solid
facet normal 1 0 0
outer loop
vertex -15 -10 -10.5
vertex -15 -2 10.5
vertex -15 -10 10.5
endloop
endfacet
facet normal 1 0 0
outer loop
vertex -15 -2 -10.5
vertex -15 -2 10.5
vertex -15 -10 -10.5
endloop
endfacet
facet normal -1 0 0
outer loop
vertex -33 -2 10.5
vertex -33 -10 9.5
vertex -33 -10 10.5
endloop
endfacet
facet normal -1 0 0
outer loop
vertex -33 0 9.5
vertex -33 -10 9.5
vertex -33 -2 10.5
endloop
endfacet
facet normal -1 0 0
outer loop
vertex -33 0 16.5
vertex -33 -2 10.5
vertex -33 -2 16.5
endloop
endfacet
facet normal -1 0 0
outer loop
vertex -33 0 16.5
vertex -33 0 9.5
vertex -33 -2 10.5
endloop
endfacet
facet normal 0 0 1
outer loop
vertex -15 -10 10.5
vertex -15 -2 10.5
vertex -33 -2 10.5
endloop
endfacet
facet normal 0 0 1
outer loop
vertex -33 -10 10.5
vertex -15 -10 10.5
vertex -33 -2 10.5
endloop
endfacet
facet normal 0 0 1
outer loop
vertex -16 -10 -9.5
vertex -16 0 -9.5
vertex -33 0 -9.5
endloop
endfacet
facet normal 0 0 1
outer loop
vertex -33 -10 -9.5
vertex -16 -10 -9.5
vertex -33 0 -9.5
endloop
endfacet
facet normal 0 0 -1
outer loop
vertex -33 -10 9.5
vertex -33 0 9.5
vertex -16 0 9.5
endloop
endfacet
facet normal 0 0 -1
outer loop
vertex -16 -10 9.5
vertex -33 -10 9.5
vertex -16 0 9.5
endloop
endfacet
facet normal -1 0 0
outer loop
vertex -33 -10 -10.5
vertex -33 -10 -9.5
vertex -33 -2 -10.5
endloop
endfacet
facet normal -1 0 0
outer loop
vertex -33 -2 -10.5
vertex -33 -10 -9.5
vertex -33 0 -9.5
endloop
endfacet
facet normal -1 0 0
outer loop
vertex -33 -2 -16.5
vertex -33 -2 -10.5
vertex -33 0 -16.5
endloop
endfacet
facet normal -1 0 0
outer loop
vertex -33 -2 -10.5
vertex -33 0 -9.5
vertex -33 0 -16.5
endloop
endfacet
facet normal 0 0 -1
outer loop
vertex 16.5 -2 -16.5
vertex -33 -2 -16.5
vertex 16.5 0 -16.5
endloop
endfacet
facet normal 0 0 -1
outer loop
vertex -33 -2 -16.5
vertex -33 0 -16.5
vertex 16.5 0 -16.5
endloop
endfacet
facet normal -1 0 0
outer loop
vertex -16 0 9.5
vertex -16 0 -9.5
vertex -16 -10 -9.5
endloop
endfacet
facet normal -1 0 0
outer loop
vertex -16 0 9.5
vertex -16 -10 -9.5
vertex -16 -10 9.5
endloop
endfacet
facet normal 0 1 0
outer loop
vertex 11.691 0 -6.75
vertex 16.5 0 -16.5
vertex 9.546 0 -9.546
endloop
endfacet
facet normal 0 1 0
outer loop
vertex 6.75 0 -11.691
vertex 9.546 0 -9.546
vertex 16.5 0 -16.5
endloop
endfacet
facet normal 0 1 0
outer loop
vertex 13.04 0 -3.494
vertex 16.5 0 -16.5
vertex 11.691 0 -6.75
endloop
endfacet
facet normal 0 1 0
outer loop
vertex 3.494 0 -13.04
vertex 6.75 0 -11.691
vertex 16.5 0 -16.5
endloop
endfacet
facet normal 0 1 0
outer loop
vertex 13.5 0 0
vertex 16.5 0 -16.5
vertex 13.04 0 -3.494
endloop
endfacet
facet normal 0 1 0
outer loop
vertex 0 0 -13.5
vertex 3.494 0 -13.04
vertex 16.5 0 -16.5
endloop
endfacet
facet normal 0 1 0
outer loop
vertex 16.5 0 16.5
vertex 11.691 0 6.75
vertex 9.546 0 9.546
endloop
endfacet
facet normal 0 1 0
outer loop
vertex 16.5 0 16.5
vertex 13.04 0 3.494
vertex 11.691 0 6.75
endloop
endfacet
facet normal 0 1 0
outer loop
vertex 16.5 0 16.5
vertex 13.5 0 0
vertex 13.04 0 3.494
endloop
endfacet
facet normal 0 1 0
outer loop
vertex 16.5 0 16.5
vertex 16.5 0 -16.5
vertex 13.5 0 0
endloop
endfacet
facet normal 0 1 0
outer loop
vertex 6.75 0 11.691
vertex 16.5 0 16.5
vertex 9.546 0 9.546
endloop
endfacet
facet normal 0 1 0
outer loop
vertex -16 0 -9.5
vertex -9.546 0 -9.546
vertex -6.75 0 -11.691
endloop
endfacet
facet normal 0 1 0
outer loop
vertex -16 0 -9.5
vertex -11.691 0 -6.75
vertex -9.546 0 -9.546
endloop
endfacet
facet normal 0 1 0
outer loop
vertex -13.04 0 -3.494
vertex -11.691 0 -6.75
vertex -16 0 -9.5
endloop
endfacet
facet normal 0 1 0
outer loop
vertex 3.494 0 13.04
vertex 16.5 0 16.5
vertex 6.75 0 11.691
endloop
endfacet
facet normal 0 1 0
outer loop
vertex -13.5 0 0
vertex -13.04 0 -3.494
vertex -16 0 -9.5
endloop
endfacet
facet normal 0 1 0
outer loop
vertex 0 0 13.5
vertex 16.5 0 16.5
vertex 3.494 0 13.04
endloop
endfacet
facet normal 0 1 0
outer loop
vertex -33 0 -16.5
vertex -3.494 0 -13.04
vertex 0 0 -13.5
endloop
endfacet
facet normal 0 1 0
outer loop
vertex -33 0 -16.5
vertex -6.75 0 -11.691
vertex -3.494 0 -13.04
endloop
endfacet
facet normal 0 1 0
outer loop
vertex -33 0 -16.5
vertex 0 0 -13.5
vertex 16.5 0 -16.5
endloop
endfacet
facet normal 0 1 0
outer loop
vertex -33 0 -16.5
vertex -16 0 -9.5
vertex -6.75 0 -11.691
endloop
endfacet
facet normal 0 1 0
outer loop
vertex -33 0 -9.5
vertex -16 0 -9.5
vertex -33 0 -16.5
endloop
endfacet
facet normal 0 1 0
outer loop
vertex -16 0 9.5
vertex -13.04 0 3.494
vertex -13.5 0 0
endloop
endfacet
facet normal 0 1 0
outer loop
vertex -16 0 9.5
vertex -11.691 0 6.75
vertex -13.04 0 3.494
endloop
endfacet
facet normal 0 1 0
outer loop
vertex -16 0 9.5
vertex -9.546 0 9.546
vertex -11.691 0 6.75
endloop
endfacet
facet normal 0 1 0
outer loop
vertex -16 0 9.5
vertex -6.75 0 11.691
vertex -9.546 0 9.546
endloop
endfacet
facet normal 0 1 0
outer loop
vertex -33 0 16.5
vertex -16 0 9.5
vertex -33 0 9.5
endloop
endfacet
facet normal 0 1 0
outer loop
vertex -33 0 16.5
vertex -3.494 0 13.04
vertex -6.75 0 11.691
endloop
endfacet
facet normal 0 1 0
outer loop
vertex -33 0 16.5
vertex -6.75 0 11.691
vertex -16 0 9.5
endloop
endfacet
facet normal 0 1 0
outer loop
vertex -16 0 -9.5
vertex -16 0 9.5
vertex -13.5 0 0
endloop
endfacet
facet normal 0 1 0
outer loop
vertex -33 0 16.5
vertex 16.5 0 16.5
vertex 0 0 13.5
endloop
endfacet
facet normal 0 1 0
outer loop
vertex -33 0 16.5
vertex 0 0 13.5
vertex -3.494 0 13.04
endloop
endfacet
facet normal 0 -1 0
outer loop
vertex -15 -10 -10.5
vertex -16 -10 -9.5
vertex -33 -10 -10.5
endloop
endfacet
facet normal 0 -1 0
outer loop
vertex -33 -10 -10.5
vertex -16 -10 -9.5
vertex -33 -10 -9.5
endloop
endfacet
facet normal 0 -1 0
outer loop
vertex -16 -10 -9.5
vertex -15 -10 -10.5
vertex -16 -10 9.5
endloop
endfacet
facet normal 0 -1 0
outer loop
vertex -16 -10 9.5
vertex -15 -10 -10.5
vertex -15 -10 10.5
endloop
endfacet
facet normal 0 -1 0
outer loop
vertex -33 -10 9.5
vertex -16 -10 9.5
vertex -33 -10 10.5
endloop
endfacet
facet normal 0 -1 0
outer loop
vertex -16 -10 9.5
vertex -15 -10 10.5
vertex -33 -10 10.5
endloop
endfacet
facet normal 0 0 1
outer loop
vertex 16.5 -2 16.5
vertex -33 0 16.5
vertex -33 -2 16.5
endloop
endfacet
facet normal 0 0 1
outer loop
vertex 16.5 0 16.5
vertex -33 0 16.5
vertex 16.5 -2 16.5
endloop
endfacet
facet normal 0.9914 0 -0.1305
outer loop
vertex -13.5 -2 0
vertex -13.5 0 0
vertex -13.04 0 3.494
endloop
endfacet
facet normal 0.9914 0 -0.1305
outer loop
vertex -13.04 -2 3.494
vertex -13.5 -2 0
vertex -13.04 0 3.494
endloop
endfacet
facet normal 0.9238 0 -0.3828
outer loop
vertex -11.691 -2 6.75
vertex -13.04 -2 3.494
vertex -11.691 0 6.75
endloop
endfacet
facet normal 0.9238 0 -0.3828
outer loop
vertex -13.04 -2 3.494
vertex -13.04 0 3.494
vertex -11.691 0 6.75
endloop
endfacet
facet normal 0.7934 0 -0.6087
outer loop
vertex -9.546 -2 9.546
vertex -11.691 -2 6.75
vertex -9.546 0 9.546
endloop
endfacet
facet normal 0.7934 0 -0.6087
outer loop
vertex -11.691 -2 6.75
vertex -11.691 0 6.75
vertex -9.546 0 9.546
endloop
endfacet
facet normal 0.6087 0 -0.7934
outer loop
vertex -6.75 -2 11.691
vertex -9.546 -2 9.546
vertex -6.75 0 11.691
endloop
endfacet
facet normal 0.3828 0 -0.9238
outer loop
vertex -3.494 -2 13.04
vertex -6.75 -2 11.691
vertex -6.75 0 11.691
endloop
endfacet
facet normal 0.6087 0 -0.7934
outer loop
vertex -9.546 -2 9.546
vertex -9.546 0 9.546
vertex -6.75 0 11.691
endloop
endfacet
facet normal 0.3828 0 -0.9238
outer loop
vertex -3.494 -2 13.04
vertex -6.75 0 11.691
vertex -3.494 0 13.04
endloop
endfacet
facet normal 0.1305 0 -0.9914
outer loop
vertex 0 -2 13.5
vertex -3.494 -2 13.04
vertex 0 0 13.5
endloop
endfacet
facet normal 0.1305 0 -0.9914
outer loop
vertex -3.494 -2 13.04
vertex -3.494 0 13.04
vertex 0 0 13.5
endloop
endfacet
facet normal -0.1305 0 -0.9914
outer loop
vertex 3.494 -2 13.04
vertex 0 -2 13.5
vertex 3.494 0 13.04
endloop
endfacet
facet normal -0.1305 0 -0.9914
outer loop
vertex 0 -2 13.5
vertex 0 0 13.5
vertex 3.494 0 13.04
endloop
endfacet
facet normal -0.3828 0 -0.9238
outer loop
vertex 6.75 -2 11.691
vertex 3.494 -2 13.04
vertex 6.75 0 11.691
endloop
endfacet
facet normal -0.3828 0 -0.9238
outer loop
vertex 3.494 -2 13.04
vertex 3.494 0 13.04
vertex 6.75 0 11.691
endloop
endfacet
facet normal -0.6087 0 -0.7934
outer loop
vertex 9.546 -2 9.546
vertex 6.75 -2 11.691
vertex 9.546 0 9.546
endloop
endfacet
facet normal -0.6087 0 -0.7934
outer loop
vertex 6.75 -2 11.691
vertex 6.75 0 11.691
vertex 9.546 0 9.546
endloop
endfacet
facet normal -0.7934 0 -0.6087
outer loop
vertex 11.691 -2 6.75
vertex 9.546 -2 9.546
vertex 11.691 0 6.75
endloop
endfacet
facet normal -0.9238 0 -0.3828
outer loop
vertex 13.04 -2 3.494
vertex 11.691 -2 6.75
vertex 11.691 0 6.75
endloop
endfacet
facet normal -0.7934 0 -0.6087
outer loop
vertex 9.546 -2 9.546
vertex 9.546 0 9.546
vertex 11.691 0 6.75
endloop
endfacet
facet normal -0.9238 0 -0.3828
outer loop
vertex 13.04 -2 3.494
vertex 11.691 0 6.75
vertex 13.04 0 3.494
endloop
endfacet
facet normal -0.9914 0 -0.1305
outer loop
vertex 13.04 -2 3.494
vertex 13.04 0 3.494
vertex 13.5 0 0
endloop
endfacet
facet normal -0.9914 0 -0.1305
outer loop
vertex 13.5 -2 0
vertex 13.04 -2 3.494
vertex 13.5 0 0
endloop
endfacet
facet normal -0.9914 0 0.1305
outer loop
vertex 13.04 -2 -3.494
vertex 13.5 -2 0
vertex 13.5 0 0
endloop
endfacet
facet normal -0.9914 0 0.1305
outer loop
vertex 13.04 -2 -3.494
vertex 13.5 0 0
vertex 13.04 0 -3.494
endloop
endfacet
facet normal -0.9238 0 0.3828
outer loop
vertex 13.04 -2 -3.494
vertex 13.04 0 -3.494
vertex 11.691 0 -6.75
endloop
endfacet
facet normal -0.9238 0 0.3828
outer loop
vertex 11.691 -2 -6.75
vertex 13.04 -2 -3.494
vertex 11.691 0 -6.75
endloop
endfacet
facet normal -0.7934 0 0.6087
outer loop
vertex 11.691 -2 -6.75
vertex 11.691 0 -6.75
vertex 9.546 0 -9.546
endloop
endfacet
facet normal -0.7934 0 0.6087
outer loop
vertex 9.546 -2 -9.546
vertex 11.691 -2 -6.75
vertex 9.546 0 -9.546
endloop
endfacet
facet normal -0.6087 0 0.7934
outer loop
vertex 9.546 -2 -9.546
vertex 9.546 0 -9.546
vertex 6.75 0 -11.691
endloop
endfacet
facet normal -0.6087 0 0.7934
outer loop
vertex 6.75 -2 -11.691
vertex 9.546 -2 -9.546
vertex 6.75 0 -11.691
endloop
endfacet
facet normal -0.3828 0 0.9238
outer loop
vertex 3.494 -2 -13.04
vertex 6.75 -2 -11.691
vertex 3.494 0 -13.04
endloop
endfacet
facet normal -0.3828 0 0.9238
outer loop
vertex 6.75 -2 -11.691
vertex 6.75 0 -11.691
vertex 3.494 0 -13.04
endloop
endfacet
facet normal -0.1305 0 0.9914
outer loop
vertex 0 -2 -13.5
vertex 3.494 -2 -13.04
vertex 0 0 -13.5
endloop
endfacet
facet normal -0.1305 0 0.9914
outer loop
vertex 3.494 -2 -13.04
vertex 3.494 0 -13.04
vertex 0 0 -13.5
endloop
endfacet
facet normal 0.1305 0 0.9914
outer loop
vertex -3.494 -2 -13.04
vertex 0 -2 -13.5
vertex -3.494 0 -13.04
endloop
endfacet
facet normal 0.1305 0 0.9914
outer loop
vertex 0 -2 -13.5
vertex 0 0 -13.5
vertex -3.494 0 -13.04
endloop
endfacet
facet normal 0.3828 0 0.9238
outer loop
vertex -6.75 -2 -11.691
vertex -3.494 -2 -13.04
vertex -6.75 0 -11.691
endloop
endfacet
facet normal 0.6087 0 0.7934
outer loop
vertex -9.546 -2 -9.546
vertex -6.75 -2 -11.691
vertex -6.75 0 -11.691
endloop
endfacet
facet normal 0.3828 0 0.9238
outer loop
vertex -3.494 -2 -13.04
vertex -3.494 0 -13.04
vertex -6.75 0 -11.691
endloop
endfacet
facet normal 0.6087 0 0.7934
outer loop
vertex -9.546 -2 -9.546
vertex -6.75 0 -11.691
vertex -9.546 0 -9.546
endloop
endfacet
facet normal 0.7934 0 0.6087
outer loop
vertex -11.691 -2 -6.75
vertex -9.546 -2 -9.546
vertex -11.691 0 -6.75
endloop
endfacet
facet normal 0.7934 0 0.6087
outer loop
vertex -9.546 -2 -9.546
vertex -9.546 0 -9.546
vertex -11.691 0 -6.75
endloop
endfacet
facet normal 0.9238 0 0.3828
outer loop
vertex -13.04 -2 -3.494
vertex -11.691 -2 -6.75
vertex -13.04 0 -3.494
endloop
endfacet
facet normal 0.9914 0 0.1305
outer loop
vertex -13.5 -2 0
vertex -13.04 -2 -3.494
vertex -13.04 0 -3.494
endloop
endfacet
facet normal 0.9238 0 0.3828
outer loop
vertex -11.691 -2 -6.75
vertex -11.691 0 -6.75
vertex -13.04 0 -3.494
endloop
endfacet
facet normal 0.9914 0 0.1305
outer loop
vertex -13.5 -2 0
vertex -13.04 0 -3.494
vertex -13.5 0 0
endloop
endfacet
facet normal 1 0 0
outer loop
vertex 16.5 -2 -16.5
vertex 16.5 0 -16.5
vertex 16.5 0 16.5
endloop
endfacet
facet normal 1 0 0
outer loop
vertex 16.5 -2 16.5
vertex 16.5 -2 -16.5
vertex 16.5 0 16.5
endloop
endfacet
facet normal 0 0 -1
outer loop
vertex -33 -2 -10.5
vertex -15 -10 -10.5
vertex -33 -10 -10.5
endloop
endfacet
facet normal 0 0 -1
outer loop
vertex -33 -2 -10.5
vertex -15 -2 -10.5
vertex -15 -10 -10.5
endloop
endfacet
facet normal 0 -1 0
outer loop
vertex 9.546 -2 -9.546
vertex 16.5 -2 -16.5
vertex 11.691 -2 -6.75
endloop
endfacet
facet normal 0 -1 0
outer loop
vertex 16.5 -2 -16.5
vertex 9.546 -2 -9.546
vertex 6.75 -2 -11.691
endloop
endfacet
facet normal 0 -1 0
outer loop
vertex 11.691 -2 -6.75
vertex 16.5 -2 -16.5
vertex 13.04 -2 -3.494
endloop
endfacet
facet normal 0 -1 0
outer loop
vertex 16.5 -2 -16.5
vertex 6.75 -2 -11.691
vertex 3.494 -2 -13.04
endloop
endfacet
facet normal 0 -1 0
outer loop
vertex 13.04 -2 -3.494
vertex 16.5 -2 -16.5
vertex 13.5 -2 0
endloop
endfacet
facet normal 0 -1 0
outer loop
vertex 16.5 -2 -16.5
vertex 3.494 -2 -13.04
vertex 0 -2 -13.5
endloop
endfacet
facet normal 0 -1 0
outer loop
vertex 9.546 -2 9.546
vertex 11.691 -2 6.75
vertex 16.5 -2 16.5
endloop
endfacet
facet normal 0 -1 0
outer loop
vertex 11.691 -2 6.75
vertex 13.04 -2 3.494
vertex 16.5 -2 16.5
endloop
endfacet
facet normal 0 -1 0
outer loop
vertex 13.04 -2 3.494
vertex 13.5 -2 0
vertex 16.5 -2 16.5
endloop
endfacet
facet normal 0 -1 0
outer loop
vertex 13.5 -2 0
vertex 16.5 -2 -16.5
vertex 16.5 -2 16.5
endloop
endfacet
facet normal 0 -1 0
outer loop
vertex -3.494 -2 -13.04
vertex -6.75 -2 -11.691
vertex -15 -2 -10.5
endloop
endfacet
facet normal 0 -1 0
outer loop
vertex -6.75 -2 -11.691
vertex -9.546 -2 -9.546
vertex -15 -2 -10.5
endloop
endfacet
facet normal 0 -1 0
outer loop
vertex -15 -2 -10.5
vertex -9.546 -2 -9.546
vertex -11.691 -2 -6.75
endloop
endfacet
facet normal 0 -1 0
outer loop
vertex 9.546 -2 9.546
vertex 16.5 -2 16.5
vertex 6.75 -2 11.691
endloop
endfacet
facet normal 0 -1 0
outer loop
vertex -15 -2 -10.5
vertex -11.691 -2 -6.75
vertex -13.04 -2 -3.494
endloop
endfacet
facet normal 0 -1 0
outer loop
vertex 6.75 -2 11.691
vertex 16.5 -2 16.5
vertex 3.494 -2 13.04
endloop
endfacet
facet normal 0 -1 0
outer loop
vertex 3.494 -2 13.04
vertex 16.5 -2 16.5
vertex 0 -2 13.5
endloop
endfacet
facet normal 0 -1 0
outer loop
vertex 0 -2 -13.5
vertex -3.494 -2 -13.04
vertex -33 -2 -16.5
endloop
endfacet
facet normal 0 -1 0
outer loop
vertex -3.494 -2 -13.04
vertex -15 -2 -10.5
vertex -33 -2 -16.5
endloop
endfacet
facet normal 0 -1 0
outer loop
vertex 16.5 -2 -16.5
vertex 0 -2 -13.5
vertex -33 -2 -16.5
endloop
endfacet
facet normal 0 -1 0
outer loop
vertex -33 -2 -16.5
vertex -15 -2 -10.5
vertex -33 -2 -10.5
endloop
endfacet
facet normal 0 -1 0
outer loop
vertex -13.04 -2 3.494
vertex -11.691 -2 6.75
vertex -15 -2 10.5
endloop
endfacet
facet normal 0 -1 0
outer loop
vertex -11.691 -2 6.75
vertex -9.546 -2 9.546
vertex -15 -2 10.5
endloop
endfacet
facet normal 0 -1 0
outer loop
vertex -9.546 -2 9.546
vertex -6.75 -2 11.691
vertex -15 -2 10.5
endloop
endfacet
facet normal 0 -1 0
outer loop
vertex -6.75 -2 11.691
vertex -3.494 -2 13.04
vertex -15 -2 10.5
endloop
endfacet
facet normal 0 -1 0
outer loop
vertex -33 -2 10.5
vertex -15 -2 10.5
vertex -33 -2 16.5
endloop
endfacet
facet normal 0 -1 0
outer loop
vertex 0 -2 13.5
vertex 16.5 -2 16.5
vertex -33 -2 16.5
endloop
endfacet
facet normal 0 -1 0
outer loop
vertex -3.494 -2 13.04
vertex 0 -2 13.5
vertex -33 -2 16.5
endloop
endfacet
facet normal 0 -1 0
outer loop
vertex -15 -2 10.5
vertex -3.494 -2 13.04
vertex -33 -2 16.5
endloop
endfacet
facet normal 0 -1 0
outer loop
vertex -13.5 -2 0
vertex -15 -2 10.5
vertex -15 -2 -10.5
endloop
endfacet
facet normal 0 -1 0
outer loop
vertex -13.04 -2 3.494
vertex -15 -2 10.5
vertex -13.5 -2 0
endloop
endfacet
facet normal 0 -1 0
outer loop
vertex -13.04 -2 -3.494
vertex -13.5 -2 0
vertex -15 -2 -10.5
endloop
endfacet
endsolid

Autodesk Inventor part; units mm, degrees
ref_plane "YZ Plane" through (0, 0, 0) normal (1, 0, 0) x (0, 1, 0)
ref_plane "XZ Plane" through (0, 0, 0) normal (0, 1, 0) x (-1, 0, 0)
ref_plane "XY Plane" through (0, 0, 0) normal (0, 0, 1) x (1, 0, 0)
sketch "Sketch1" plane through (0, 0, 0) normal (0, 1, 0) x (-1, 0, 0)
  circle A0 centre (0, 0) radius 13.5
  line L0 (0, -13.5) -> (30, -13.5) construction
  line L1 (0, 13.5) -> (30, 13.5) construction
  line L2 (30, 13.5) -> (30, -13.5) construction
  line L3 (0, -13.5) -> (16, -13.5) construction
  line L4 (0, 13.5) -> (16, 13.5) construction
  line L5 (16, 13.5) -> (16, -13.5) construction
  line L6 (30, 13.5) -> (30, 9.5) construction
  line L7 (30, -13.5) -> (30, -9.5) construction
  line L8 (30, 9.5) -> (16, 9.5)
  line L9 (30, -9.5) -> (16, -9.5)
  line L10 (16, -9.5) -> (16, 9.5)
  line L11 (0, -13.5) -> (0, -16.5) construction
  line L12 (0, 13.5) -> (0, 16.5) construction
  line L13 (30, -2.5) -> (33, -2.5) construction
  line L14 (-13.5, 0) -> (-16.5, 0) construction
  line L15 (33, -2.5) -> (33, -16.5)
  line L16 (33, -16.5) -> (0, -16.5)
  line L17 (33, -2.5) -> (33, 16.5)
  line L18 (33, 16.5) -> (0, 16.5)
  line L19 (0, 16.5) -> (-16.5, 16.5)
  line L20 (-16.5, 0) -> (-16.5, 16.5)
  line L21 (0, -16.5) -> (-16.5, -16.5)
  line L22 (-16.5, -16.5) -> (-16.5, 0)
  line L23 (30, 9.5) -> (33, 9.5)
  line L24 (30, -9.5) -> (33, -9.5)
  line L25 (0, 13.5) -> (15, 13.5) construction
  line L26 (0, -13.5) -> (15, -13.5) construction
  line L27 (15, 13.5) -> (15, -13.5) construction
  line L28 (33, 9.5) -> (33, 10.5) construction
  line L29 (33, 10.5) -> (15, 10.5) construction
  line L30 (33, -9.5) -> (33, -10.5) construction
  line L31 (33, -10.5) -> (15, -10.5) construction
  line L32 (15, 10.5) -> (15, -10.5)
  line L33 (15, -10.5) -> (33, -10.5)
  line L34 (15, 10.5) -> (33, 10.5)
  dimension "d0" = 27
  dimension "d1" = 30
  dimension "d2" = 30
  dimension "d3" = 16
  dimension "d4" = 16
  dimension "d5" = 4
  dimension "d6" = 4
  dimension "d7" = 3
  dimension "d8" = 3
  dimension "d9" = 3
  dimension "d10" = 3
  dimension "d15" = 19
  dimension "d16" = 15
  dimension "d17" = 15
  dimension "d18" = 1
  dimension "d19" = 1
extrude "Extrusion3" add sketch "Sketch1" against normal blind 2 contours L34 L32 L33 L15 L16 L21 L22 L20 L19 L18 L17
extrude "Extrusion4" add sketch "Sketch1" against normal blind 10 contours L8 L10 L9 L24 L15 L33 L32 L34 L17 L23
properties part number "joystick_test_v1"
